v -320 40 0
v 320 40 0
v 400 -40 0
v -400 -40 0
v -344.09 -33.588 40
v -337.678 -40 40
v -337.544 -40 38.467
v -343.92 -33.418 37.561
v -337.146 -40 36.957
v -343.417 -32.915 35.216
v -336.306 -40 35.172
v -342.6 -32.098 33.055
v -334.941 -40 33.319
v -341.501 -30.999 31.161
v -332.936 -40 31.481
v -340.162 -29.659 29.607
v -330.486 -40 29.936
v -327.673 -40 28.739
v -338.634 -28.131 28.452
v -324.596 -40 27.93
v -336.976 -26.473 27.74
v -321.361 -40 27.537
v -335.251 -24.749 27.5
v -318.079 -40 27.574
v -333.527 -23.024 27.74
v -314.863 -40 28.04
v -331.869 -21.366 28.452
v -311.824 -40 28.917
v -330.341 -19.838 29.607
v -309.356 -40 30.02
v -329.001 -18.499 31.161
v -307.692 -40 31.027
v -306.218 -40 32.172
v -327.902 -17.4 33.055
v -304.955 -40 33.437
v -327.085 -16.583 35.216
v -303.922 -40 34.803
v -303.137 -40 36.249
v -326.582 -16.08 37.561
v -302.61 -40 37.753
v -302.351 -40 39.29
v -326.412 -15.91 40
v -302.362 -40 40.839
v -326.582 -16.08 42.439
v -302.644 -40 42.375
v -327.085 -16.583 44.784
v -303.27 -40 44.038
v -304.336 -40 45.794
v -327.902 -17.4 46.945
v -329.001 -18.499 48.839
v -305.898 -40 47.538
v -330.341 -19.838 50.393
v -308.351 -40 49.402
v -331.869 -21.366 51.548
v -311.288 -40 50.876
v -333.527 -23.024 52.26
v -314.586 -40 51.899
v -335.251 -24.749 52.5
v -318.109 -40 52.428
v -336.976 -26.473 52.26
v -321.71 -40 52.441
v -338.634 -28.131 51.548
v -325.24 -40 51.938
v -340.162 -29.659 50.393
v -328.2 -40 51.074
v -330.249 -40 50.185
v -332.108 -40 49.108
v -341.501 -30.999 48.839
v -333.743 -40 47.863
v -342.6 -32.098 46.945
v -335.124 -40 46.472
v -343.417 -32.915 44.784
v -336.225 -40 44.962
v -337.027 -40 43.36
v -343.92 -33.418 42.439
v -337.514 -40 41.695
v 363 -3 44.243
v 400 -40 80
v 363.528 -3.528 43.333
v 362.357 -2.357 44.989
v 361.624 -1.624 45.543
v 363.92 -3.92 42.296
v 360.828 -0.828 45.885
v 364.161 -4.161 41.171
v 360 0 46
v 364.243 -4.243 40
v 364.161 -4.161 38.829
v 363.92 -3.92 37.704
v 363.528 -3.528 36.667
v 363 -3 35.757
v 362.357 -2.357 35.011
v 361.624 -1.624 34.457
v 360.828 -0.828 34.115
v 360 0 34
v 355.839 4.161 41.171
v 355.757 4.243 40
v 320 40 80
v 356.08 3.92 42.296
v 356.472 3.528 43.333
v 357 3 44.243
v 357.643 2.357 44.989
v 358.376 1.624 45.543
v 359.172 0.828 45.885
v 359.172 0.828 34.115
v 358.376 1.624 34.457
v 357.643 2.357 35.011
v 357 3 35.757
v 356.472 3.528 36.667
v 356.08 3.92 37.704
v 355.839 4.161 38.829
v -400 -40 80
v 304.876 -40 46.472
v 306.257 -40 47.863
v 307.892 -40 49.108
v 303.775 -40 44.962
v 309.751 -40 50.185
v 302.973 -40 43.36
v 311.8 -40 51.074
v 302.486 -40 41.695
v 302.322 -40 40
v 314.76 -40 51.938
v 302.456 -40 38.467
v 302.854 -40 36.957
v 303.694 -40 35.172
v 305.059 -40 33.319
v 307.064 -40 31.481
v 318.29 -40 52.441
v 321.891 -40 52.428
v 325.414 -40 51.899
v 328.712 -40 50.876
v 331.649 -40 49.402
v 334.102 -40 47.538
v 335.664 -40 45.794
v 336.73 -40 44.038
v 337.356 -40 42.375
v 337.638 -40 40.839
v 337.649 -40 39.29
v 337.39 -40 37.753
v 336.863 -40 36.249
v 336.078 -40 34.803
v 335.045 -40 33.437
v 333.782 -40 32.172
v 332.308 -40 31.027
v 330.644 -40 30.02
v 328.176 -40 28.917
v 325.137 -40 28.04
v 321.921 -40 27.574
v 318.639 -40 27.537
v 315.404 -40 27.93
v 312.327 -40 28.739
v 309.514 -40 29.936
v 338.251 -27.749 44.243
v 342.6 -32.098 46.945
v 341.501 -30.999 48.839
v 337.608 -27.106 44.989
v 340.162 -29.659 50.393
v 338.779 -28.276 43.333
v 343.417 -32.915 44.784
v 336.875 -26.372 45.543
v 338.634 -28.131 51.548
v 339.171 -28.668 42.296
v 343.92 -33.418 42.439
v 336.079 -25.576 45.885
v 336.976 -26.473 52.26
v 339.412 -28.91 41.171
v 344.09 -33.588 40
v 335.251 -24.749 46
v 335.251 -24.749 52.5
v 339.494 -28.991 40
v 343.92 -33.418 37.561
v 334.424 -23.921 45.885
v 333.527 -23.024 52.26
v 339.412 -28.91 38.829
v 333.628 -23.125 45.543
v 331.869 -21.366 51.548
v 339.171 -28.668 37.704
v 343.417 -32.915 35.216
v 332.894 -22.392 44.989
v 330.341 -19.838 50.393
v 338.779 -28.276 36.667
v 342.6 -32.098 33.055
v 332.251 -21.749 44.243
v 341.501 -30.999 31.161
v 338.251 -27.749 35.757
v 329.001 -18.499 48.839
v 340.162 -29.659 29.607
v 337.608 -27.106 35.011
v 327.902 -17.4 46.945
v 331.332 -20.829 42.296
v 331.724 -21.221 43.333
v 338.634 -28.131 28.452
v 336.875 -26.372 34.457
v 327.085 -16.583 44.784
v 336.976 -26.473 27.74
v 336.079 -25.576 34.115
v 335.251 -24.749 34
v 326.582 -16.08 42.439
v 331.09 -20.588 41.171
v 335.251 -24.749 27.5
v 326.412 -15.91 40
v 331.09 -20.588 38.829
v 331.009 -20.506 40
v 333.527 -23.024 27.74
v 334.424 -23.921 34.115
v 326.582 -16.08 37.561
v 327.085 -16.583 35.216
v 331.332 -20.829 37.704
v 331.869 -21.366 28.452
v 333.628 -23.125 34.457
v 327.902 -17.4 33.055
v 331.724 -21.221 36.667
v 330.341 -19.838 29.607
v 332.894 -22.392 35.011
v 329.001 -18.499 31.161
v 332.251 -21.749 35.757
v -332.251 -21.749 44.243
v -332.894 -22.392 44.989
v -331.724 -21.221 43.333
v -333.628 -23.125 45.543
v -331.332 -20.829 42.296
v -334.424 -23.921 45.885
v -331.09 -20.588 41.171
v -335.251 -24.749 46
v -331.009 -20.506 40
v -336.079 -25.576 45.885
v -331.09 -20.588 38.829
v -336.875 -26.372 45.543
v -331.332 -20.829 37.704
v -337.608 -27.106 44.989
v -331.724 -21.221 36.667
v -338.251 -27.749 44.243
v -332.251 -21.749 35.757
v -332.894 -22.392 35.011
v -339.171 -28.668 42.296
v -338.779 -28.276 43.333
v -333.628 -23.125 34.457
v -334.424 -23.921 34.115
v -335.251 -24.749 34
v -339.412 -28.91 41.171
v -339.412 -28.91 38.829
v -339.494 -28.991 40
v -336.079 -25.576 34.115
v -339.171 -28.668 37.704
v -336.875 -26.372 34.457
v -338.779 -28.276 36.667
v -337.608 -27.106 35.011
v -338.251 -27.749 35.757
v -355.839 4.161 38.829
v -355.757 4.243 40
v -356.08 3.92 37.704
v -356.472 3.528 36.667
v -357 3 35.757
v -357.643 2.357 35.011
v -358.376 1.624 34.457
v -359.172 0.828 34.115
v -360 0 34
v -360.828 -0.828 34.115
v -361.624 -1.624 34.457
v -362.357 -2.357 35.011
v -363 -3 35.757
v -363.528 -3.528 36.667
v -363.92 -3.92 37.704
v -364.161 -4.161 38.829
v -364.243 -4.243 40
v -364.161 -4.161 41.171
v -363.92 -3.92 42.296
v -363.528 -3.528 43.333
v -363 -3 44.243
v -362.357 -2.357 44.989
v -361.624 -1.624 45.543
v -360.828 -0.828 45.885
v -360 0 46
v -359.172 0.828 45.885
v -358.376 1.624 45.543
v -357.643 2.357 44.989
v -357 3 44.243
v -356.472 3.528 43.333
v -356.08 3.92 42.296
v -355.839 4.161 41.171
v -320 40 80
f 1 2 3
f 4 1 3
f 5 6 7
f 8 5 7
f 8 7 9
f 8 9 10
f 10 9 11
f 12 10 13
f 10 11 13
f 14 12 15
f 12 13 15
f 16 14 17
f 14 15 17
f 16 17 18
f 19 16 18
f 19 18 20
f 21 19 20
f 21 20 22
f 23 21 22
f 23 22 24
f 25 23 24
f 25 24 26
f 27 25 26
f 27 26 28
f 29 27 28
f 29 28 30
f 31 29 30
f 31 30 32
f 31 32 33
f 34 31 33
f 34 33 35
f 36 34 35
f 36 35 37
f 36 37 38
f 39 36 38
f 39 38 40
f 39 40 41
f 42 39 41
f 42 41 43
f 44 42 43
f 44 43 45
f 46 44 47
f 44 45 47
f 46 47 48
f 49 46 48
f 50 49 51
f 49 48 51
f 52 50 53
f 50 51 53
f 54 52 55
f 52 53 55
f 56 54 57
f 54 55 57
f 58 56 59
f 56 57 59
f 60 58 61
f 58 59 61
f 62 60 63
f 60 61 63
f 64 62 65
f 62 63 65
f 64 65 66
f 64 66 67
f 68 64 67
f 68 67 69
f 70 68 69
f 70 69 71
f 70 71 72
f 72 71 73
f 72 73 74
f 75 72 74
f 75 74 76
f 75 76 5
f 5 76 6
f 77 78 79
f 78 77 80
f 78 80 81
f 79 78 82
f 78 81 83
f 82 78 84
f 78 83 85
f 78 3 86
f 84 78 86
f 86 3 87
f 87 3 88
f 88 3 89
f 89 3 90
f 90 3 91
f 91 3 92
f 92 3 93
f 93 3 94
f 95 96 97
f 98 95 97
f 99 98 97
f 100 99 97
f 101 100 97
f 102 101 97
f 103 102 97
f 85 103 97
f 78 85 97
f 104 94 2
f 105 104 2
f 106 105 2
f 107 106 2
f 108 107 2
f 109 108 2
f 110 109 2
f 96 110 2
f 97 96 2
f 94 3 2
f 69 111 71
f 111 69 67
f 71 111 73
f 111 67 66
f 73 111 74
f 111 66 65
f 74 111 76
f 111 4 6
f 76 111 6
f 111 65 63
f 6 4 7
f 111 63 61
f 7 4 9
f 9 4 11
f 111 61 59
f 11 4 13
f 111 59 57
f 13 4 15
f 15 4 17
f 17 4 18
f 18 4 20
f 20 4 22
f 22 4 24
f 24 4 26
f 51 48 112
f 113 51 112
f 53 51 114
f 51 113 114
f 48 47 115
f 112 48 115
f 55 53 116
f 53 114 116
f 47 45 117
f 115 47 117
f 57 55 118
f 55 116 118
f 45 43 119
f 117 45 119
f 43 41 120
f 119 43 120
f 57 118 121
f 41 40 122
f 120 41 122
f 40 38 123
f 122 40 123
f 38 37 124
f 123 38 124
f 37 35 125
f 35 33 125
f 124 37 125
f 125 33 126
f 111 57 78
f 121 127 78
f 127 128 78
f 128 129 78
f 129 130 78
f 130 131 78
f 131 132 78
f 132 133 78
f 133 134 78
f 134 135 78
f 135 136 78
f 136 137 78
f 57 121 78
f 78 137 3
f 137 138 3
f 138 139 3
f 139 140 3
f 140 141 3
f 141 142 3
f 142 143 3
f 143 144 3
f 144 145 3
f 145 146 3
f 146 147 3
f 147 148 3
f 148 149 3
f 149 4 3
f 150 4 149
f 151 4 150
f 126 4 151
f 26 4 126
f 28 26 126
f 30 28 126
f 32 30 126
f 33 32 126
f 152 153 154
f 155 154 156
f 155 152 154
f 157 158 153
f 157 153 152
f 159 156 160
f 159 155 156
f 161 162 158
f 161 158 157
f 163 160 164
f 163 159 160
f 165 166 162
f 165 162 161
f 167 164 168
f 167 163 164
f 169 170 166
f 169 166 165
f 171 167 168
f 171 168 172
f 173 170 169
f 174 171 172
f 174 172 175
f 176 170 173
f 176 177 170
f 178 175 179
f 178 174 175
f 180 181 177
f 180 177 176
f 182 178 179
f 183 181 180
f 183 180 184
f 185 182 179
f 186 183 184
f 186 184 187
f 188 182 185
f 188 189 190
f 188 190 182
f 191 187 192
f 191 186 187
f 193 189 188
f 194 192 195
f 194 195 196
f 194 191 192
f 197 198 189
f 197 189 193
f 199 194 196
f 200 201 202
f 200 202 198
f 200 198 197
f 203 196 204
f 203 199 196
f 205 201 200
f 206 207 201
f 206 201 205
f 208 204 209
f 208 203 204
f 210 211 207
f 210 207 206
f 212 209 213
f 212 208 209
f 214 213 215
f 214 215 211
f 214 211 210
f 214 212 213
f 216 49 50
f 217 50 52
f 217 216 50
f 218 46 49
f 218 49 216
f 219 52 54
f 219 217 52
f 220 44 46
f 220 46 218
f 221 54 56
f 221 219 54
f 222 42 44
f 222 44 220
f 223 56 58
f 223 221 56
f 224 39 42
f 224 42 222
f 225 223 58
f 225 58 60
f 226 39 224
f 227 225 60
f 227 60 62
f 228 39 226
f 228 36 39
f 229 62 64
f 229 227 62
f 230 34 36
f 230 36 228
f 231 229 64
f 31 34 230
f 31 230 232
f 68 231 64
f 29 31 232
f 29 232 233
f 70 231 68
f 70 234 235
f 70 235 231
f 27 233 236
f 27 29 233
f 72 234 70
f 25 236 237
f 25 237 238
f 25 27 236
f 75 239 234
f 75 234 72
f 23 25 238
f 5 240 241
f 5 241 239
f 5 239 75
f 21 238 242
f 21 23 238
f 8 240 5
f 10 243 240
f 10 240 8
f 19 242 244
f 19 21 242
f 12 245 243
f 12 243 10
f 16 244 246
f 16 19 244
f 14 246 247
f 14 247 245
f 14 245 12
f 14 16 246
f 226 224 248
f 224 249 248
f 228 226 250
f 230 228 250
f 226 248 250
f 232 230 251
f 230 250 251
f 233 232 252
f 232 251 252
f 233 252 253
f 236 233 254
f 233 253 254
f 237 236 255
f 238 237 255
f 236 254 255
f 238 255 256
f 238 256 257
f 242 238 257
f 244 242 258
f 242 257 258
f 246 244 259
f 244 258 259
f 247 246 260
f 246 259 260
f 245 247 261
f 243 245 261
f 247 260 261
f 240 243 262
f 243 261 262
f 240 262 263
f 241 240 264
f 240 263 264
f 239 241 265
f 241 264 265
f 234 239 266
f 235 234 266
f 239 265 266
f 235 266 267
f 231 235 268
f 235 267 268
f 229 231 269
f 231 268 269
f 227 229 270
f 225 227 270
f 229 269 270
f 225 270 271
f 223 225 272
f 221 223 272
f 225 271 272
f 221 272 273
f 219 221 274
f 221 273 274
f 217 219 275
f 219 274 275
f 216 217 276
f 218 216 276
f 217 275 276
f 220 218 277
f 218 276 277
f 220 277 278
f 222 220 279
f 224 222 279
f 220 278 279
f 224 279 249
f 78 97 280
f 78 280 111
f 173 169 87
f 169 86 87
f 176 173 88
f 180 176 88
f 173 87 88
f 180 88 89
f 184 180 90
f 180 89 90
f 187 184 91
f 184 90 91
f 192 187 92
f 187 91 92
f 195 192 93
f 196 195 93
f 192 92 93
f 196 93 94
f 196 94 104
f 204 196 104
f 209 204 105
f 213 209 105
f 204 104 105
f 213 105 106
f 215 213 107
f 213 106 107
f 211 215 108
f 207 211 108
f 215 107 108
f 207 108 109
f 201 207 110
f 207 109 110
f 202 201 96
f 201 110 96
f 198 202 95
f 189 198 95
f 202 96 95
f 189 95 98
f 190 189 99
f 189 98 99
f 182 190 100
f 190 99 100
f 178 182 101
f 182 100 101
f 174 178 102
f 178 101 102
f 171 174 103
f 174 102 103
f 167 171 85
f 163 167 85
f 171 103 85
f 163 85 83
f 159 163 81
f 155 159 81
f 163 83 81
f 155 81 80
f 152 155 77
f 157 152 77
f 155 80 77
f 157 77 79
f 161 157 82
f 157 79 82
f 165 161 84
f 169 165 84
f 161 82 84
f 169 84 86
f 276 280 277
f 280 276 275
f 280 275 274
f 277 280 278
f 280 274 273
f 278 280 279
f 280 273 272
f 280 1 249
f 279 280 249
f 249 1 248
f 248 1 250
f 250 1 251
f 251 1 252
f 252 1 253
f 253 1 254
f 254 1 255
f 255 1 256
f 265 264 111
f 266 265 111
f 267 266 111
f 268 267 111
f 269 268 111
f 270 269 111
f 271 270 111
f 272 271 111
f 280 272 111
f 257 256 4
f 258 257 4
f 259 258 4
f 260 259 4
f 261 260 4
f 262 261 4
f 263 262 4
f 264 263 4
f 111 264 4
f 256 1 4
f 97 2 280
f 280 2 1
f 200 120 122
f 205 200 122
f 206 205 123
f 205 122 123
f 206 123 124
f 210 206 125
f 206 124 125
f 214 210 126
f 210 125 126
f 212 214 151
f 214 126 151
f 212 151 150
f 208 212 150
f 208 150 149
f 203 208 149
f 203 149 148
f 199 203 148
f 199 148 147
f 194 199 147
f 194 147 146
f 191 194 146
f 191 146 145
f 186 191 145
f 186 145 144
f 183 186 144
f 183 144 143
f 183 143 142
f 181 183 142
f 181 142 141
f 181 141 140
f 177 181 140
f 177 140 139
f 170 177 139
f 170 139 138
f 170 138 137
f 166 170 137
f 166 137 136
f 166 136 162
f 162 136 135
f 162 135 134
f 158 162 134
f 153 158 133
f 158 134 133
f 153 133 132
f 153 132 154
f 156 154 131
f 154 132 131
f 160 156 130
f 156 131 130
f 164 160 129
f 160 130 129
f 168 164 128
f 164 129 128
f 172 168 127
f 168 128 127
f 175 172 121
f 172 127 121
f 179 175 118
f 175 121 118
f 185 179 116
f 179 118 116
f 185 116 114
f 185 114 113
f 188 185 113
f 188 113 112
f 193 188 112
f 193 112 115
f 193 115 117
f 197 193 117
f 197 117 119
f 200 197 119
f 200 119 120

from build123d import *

# Parameters (mm, degrees)
F1_DEPTH       = 80
F5_D           = 12
F5_CBORE_D     = 25
F5_CBORE_DEPTH = 40
F9_D           = 12
F9_CBORE_D     = 25
F9_CBORE_DEPTH = 40


with BuildPart() as f1:
    # F0 (on Top) → F1 (new body)
    with BuildSketch(Plane.XY):
        Polygon((320, 40), (-320, 40), (-400, -40), (400, -40), align=None)
    extrude(amount=F1_DEPTH)

    # F5 (through all)
    with Locations(Plane(origin=(-126.966991411, 126.966991411, 0), x_dir=(-0.7071067812, -0.7071067812, 0), z_dir=(0.7071067812, -0.7071067812, 0))):
        with Locations((254.5584412272, -40)):
            CounterBoreHole(F5_D / 2, F5_CBORE_D / 2, F5_CBORE_DEPTH)

    # F9 (through all)
    with Locations(Plane(origin=(126.966991411, 126.966991411, 0), x_dir=(-0.7071067812, 0.7071067812, 0), z_dir=(-0.7071067812, -0.7071067812, 0))):
        with Locations((-254.5584412272, -40)):
            CounterBoreHole(F9_D / 2, F9_CBORE_D / 2, F9_CBORE_DEPTH)


solid = f1.part
